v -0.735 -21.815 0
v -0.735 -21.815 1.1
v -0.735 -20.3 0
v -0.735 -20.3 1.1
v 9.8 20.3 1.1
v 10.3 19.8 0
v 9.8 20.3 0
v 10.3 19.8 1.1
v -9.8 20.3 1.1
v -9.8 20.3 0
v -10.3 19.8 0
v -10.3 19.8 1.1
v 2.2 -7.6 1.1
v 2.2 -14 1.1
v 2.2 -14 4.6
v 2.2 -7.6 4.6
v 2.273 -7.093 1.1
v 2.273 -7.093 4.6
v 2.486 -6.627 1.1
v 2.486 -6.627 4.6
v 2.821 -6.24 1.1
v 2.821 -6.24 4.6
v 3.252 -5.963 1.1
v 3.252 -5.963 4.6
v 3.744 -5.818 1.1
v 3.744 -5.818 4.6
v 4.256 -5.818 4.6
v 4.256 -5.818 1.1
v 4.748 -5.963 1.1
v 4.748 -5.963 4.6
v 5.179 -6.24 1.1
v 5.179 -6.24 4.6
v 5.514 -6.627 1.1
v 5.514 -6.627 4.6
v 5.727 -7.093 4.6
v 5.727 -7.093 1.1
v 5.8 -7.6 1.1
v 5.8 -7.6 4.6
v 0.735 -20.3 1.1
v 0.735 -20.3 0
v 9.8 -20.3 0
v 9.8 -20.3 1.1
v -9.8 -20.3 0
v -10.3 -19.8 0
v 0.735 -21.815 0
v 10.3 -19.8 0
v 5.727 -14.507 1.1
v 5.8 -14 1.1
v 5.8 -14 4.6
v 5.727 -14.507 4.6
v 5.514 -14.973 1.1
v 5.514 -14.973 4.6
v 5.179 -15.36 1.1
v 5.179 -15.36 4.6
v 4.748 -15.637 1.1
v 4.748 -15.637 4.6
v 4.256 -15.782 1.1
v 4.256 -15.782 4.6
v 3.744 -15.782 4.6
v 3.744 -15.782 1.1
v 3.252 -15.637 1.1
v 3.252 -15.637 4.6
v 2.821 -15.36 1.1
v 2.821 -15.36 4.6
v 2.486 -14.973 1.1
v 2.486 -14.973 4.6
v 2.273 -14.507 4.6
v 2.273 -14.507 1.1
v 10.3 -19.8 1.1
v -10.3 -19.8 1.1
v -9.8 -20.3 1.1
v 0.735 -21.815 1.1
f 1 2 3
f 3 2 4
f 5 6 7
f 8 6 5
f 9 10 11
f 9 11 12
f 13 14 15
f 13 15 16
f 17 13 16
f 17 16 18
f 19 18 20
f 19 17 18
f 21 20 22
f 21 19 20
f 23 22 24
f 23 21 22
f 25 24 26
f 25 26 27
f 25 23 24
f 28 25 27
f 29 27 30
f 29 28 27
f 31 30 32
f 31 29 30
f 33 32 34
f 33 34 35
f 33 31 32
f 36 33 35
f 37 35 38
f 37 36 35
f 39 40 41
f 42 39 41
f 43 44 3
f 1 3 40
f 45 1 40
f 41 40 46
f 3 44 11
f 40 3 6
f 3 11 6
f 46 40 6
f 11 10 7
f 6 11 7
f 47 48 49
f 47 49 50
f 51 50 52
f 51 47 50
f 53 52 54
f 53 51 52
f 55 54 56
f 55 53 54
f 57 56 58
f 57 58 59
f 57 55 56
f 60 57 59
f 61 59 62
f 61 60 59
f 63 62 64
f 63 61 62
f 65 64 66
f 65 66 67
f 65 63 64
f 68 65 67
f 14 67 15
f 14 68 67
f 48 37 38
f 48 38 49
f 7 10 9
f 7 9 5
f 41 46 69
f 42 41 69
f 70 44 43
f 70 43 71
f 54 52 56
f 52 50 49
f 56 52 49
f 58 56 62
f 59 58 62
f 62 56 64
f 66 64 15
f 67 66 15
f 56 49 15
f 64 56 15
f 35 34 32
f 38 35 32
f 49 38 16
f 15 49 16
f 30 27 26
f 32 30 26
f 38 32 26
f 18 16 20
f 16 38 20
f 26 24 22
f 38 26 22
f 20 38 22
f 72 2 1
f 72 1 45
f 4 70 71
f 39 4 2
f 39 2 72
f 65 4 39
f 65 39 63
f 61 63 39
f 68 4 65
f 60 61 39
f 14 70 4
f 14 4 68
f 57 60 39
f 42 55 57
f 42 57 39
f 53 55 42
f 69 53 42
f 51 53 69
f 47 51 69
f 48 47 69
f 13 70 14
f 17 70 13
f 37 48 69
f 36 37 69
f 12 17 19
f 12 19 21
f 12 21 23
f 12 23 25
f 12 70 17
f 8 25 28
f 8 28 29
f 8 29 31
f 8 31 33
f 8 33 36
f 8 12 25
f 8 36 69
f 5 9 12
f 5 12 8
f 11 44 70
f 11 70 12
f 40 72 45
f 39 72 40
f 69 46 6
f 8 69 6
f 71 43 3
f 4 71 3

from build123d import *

# Parameters (mm, degrees)
SKETCH_1_W      = 20.6
SKETCH_1_H      = 40.6
EXTRUDE_1_DEPTH = 1.1
EXTRUDE_2_DEPTH = 3.5
SKETCH_3_W      = 1.46922728
SKETCH_3_H      = 3.03026103
EXTRUDE_3_DEPTH = 1.1
CHAMFER_1_SIZE  = 0.5


with BuildPart() as part:
    # Эскиз1 → Бобышка-Вытянуть1 (new body)
    with BuildSketch(Plane.XY):
        Rectangle(SKETCH_1_W, SKETCH_1_H)
    extrude(amount=EXTRUDE_1_DEPTH)

    # Эскиз2 → Бобышка-Вытянуть2 (add)
    with BuildSketch(Plane.XY.offset(1.1)):
        with BuildLine():
            Line((5.8, -7.6), (5.8, -14))
            ThreePointArc((5.8, -14), (4, -15.8), (2.2, -14))
            Line((2.2, -14), (2.2, -7.6))
            ThreePointArc((2.2, -7.6), (4, -5.8), (5.8, -7.6))
        make_face()
    extrude(amount=EXTRUDE_2_DEPTH)

    # Эскиз3 → Бобышка-Вытянуть3 (add)
    with BuildSketch(Plane.XY.offset(1.1)):
        with Locations((0, -20.3)):
            Rectangle(SKETCH_3_W, SKETCH_3_H)
    extrude(amount=-EXTRUDE_3_DEPTH)

    # Фаска1
    chamfer_1_edges = [part.edges().sort_by_distance(p)[0] for p in [
        (10.3, -20.3, 0.55),
        (-10.3, -20.3, 0.55),
        (-10.3, 20.3, 0.55),
        (10.3, 20.3, 0.55),
    ]]
    chamfer(chamfer_1_edges, length=CHAMFER_1_SIZE)


solid = part.part
